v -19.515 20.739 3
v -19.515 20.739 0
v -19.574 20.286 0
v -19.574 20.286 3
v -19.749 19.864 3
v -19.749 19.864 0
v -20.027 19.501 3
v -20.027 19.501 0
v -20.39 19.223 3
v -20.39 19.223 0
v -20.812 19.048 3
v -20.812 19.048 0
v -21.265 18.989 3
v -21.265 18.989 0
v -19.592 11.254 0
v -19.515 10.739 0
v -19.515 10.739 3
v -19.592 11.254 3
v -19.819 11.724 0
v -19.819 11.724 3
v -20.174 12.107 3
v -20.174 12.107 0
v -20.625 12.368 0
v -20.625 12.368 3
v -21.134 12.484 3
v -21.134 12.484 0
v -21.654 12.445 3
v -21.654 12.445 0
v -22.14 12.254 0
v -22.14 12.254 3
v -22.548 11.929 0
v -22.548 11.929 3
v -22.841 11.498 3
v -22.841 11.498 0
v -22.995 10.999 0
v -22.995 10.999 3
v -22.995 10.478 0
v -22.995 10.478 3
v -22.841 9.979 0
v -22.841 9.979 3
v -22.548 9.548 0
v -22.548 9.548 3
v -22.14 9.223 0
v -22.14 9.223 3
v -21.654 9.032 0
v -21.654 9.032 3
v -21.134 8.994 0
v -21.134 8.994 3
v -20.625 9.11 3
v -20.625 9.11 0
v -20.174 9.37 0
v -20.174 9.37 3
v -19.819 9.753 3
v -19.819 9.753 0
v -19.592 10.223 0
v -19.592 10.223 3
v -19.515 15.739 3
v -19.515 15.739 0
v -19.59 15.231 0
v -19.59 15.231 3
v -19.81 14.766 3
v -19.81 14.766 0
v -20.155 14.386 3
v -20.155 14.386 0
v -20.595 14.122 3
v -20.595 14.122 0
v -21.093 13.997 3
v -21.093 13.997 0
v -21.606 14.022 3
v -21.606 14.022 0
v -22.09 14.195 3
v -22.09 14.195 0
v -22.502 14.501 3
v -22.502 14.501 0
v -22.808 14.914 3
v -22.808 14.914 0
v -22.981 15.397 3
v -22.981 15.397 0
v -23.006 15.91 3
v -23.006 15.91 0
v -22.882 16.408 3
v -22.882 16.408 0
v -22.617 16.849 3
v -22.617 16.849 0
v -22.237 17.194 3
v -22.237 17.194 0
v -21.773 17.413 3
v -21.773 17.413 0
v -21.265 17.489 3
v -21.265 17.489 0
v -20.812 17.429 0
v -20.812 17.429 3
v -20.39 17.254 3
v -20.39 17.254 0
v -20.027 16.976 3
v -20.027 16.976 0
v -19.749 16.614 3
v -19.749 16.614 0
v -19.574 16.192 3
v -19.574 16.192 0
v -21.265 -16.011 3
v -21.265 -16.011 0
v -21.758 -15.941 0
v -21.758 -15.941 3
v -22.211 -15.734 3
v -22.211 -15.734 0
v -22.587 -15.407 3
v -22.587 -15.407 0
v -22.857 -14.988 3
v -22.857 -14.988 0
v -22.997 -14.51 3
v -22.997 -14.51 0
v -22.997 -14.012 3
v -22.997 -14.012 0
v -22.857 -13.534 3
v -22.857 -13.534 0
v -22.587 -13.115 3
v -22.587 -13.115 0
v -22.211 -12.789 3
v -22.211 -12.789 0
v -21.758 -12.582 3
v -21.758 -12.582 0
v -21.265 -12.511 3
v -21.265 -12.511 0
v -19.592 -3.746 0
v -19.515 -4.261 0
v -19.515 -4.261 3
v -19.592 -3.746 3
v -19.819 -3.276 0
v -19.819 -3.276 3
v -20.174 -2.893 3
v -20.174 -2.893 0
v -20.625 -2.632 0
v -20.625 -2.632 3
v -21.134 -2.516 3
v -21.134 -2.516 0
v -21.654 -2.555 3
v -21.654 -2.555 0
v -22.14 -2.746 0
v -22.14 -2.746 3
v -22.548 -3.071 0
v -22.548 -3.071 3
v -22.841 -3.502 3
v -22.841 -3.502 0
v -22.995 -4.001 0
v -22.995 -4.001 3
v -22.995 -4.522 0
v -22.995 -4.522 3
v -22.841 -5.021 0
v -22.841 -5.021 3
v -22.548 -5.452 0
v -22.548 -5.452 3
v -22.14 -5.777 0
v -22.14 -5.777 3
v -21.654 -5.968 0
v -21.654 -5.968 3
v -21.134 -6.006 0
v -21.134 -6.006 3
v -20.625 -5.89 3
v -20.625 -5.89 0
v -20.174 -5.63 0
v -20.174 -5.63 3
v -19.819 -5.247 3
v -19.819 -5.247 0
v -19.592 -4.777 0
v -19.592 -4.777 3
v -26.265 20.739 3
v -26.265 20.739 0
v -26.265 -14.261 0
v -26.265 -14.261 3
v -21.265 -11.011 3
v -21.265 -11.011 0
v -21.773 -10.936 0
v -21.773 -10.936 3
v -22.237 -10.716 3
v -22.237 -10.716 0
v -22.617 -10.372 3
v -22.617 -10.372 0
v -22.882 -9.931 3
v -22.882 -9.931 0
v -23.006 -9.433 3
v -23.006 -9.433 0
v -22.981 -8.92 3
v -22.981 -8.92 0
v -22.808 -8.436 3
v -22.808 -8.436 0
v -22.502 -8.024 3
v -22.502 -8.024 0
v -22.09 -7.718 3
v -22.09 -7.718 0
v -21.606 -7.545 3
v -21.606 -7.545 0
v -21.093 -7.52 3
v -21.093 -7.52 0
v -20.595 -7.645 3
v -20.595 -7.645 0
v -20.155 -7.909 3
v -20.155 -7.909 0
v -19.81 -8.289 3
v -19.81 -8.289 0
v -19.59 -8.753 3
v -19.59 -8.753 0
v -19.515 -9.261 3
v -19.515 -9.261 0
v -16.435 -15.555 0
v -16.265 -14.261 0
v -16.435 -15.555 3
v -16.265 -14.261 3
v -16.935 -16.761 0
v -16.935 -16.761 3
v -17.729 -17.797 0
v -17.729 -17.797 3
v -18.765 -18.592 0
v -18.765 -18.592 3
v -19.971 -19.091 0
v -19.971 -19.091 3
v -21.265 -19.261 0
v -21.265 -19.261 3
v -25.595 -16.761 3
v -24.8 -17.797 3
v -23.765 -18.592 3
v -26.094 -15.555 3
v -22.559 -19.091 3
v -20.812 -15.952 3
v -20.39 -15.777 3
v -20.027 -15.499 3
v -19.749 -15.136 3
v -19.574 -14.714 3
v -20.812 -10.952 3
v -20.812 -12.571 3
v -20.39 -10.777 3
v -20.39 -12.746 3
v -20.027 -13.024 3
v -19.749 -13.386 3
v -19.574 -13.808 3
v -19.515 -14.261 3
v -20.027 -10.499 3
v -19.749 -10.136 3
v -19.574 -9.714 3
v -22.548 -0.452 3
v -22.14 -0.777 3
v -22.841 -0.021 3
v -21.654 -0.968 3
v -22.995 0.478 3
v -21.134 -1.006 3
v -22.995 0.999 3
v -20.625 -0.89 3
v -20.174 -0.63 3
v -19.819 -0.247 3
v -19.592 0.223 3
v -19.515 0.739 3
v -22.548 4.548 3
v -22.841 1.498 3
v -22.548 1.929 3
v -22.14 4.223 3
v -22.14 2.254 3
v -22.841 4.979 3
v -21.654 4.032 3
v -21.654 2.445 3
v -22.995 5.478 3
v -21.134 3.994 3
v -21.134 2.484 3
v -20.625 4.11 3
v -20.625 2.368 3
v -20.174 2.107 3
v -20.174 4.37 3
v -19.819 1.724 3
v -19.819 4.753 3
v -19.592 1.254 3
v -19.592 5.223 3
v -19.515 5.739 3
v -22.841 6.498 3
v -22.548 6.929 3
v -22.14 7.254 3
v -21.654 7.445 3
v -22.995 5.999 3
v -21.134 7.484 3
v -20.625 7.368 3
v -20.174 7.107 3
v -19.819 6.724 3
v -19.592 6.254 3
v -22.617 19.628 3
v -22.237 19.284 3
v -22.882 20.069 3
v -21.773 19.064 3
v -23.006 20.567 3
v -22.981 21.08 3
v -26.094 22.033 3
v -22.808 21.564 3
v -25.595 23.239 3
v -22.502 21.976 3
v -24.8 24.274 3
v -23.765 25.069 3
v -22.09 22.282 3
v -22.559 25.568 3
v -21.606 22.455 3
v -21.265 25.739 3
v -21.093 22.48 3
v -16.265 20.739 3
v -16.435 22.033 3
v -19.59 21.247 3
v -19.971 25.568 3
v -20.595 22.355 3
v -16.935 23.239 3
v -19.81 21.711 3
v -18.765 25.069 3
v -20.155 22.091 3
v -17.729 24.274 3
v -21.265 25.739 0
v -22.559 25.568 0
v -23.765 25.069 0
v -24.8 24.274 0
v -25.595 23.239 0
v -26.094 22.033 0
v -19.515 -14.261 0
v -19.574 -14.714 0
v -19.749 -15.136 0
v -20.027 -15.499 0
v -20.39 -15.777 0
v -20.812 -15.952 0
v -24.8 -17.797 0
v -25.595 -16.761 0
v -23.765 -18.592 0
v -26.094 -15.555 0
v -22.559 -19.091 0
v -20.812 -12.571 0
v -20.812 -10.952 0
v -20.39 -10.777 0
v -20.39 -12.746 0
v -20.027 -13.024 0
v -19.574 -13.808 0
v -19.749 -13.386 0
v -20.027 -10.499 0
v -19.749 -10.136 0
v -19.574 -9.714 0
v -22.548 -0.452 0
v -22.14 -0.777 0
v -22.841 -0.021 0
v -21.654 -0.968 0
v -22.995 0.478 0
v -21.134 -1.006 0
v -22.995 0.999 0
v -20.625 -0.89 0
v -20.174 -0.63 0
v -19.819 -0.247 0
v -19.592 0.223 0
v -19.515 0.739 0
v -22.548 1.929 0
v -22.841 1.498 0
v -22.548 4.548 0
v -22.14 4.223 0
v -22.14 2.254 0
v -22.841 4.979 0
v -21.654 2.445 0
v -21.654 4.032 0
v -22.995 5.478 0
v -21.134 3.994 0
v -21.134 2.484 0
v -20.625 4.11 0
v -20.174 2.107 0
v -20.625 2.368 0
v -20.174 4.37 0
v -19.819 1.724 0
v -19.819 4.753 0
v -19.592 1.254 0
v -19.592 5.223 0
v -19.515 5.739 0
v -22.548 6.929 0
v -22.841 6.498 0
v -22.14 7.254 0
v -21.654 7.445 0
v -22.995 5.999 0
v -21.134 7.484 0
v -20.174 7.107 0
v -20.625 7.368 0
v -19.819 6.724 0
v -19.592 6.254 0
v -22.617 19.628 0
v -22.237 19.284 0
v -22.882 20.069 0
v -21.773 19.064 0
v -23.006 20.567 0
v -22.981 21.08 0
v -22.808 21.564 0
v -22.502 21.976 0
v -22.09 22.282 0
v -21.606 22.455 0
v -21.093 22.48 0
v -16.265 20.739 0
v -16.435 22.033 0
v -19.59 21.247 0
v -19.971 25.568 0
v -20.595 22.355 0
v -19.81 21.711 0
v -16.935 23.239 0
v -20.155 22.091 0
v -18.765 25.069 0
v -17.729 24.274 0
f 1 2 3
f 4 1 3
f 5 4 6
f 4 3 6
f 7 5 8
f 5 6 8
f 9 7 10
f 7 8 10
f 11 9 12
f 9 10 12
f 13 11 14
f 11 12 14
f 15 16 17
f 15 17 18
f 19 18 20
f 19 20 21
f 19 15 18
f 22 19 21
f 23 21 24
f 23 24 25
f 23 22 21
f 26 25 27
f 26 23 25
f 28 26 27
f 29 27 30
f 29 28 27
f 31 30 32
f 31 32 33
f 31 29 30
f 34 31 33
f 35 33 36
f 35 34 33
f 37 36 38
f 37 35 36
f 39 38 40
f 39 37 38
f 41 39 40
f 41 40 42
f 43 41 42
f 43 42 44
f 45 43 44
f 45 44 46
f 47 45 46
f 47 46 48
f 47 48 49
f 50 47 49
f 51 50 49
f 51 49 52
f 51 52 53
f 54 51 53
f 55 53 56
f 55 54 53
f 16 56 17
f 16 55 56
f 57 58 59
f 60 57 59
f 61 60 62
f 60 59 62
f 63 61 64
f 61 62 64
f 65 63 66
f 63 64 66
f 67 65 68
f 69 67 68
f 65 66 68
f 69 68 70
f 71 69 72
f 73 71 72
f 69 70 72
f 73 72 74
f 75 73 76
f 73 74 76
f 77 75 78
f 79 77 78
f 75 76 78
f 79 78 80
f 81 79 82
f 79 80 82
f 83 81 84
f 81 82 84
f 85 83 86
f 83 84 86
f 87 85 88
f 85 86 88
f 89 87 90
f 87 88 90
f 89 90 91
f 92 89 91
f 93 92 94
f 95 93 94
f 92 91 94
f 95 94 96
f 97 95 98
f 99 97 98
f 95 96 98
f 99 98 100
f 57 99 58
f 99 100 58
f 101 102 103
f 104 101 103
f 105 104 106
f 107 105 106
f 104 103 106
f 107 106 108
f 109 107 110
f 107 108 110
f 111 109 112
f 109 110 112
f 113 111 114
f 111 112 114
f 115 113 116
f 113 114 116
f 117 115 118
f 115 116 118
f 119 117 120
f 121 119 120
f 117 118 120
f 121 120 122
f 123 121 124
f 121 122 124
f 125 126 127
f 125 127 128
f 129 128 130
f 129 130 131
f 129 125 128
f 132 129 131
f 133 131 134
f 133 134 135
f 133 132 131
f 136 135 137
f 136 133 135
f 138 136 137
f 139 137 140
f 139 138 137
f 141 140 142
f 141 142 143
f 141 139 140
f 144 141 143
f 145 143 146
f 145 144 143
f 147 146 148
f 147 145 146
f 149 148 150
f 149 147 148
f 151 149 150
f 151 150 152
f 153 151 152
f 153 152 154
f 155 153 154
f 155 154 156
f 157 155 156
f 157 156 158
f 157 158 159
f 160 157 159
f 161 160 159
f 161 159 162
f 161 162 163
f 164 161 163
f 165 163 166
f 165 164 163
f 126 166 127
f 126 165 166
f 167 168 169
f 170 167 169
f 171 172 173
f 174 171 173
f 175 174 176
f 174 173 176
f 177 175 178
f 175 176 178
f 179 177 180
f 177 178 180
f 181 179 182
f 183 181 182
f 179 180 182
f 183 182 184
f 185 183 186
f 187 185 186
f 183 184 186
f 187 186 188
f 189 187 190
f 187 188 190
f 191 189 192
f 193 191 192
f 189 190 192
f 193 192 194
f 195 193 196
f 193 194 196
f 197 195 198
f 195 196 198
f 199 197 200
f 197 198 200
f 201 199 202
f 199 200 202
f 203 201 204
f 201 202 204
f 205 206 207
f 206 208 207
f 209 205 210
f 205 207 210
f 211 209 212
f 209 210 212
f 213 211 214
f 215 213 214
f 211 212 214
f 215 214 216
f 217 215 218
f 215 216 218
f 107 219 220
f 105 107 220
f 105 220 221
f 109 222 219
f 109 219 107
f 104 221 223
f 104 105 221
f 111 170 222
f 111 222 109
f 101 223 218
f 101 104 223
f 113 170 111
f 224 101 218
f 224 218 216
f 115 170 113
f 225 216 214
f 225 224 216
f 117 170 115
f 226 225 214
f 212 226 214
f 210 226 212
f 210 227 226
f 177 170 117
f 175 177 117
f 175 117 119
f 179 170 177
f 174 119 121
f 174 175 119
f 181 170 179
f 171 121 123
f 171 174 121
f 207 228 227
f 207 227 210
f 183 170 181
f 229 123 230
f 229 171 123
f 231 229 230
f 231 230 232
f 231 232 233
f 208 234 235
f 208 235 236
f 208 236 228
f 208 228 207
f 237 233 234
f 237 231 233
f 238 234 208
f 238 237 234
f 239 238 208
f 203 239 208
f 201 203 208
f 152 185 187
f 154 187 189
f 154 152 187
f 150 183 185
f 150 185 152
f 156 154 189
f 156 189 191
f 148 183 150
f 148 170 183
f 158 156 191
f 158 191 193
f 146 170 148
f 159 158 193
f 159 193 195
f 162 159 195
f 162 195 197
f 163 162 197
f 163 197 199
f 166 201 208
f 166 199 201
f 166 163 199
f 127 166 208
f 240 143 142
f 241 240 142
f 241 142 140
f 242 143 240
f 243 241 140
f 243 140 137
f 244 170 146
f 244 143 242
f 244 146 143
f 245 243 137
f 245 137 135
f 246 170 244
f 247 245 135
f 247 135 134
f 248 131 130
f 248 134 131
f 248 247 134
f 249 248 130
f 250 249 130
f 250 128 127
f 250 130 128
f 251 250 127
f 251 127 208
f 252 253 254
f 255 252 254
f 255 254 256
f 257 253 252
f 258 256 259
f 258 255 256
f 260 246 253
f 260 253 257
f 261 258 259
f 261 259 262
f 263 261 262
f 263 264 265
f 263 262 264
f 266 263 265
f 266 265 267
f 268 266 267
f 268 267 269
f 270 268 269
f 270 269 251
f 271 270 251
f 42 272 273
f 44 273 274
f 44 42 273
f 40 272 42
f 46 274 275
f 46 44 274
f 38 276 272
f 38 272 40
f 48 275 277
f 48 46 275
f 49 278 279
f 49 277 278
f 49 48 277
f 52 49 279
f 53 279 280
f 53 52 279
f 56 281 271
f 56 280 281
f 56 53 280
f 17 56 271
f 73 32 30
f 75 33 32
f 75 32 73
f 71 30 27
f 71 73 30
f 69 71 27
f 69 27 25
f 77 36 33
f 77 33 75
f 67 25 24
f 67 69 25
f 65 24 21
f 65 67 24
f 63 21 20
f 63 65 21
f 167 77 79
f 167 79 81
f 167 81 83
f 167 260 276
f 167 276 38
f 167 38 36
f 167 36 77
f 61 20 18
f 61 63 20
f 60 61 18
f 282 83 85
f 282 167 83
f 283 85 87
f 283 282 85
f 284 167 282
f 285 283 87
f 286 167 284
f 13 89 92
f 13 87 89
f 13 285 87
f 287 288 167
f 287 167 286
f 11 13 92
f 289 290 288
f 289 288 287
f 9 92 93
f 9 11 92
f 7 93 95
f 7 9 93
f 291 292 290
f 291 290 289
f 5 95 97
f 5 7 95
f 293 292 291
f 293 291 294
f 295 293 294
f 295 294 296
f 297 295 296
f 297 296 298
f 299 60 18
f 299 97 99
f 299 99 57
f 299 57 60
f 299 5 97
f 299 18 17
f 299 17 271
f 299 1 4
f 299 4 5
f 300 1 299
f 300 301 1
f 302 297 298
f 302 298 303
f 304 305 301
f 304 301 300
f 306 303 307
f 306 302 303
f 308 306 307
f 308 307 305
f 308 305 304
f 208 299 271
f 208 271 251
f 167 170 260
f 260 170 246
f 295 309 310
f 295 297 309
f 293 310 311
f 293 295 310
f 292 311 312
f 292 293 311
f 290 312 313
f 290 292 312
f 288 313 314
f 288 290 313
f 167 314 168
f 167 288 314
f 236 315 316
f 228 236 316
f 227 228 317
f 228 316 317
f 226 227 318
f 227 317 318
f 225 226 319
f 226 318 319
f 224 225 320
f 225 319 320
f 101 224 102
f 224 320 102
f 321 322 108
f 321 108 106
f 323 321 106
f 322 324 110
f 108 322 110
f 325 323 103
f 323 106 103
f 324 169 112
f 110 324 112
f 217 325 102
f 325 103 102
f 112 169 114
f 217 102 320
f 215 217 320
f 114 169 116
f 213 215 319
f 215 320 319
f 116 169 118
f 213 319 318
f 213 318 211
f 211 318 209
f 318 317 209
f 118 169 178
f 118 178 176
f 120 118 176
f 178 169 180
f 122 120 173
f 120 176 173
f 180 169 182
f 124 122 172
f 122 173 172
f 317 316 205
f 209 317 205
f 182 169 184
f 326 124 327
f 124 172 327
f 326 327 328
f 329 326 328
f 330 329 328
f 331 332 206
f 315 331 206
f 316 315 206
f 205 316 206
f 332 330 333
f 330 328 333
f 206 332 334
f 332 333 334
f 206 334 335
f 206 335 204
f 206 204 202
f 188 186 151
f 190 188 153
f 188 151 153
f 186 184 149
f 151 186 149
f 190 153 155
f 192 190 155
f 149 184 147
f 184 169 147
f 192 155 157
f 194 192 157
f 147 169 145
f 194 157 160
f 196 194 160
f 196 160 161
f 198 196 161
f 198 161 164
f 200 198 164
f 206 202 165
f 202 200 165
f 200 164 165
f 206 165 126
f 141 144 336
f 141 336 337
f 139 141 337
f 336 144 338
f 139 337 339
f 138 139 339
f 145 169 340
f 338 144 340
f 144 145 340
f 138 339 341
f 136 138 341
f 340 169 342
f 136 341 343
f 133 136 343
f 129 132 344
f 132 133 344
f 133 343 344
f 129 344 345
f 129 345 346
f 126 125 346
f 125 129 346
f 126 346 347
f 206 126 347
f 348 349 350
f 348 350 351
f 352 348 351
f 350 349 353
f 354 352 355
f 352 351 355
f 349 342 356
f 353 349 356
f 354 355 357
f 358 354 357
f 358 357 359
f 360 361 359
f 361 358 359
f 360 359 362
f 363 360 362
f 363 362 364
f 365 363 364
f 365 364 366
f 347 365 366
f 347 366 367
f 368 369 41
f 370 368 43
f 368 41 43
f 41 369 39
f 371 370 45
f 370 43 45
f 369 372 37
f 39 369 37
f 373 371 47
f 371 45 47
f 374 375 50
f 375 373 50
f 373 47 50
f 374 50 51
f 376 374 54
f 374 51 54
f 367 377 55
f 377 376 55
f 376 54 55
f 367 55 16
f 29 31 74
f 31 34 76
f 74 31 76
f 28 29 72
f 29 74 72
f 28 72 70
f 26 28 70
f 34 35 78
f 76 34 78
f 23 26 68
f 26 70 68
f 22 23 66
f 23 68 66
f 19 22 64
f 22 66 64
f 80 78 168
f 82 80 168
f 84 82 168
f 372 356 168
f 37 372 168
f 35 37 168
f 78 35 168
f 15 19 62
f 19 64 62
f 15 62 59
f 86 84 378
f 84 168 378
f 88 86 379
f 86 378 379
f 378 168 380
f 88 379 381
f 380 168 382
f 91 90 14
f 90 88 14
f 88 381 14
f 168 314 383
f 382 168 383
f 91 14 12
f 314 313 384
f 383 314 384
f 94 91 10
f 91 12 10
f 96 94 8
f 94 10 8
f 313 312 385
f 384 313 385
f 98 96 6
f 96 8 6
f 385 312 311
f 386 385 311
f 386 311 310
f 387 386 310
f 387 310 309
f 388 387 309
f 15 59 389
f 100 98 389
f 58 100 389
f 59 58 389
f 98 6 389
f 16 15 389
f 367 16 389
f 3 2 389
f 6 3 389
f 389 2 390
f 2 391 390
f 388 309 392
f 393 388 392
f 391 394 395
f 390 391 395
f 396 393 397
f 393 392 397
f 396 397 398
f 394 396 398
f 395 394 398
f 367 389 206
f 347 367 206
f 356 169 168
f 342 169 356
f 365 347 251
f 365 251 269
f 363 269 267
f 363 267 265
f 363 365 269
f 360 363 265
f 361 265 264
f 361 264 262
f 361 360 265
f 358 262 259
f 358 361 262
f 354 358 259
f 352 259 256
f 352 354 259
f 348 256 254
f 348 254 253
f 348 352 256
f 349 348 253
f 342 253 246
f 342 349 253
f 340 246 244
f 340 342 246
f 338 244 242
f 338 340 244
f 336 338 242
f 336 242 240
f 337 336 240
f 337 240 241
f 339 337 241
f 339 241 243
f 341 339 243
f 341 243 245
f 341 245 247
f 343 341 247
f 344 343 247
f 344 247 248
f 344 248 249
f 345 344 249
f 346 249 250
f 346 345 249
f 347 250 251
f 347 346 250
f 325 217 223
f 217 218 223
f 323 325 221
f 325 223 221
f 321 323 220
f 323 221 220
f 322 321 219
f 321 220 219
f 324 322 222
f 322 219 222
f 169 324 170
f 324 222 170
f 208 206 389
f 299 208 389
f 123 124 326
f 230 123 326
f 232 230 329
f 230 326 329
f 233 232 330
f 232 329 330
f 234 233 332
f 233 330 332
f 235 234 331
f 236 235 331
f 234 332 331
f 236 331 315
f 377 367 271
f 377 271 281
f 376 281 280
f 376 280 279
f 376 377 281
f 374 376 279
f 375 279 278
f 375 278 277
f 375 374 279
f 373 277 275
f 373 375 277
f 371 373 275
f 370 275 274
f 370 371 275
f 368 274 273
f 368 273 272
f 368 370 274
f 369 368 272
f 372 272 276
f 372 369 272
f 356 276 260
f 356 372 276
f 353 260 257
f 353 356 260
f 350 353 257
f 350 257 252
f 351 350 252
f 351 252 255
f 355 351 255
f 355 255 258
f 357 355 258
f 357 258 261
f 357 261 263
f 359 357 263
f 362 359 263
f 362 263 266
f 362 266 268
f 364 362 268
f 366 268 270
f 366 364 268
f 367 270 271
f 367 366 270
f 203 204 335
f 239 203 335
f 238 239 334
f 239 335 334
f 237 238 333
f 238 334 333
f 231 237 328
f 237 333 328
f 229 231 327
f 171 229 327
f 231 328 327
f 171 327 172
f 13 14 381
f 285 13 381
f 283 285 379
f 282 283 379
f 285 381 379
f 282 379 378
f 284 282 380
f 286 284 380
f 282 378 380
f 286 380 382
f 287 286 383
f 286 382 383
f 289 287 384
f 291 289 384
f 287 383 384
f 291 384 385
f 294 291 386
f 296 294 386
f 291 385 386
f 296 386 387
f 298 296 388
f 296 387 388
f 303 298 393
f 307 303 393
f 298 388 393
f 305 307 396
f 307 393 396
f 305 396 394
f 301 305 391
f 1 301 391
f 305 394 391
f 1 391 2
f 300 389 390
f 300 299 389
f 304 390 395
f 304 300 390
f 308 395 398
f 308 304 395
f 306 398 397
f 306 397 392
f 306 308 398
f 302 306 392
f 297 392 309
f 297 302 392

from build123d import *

# Parameters (mm, degrees)
F0_R     = 1.75
F1_DEPTH = 3
F2_R     = 4.99999


# Not quite as in the source:
# - a fillet or chamfer is up to 0.001 mm smaller than in the source, because OpenCascade refuses the exact size


with BuildPart() as f1:
    # F0 (on Top) → F1 (new body)
    with BuildSketch(Plane.XY):
        Polygon((-16.2647291371, -19.261389355), (-16.2647291371, 20.738610645), (-16.2647291371, 25.738610645), (-26.2647291371, 25.738610645), (-26.2647291371, 3.238610645), (-26.2647291371, -19.261389355), (-21.2647291371, -19.261389355), align=None)
        with BuildLine():
            ThreePointArc((-19.5147291371, -14.261389355), (-20.0272922701, -15.4988262221), (-21.2647291371, -16.011389355))
            ThreePointArc((-21.2647291371, -16.011389355), (-23.0147291371, -14.261389355), (-21.2647291371, -12.511389355))
            ThreePointArc((-21.2647291371, -12.511389355), (-20.0272922701, -13.0239524879), (-19.5147291371, -14.261389355))
        make_face(mode=Mode.SUBTRACT)
        with BuildLine():
            ThreePointArc((-19.5147291371, -9.261389355), (-20.0272922701, -10.4988262221), (-21.2647291371, -11.011389355))
            ThreePointArc((-21.2647291371, -11.011389355), (-22.5021660042, -8.0239524879), (-19.5147291371, -9.261389355))
        make_face(mode=Mode.SUBTRACT)
        with Locations((-21.2647291371, -4.261389355)):
            Circle(F0_R, mode=Mode.SUBTRACT)
        with Locations((-21.2647291371, 0.738610645)):
            Circle(F0_R, mode=Mode.SUBTRACT)
        with Locations((-21.2647291371, 5.738610645)):
            Circle(F0_R, mode=Mode.SUBTRACT)
        with Locations((-21.2647291371, 10.738610645)):
            Circle(F0_R, mode=Mode.SUBTRACT)
        with BuildLine():
            ThreePointArc((-19.5147291371, 15.738610645), (-22.5021660042, 14.5011737779), (-21.2647291371, 17.488610645))
            ThreePointArc((-21.2647291371, 17.488610645), (-20.0272922701, 16.9760475121), (-19.5147291371, 15.738610645))
        make_face(mode=Mode.SUBTRACT)
        with BuildLine():
            ThreePointArc((-19.5147291371, 20.738610645), (-20.0272922701, 19.5011737779), (-21.2647291371, 18.988610645))
            ThreePointArc((-21.2647291371, 18.988610645), (-22.5021660042, 21.9760475121), (-19.5147291371, 20.738610645))
        make_face(mode=Mode.SUBTRACT)
    extrude(amount=F1_DEPTH)

    # F2 (radius 5 in the source; OpenCascade refuses exactly that, so slightly less here)
    f2_edges = [f1.edges().sort_by_distance(p)[0] for p in [
        (-16.264729, 25.738611, 1.5),
        (-26.264729, 25.738611, 1.5),
        (-16.264729, -19.261389, 1.5),
        (-26.264729, -19.261389, 1.5),
    ]]
    fillet(f2_edges, radius=F2_R)


solid = f1.part
